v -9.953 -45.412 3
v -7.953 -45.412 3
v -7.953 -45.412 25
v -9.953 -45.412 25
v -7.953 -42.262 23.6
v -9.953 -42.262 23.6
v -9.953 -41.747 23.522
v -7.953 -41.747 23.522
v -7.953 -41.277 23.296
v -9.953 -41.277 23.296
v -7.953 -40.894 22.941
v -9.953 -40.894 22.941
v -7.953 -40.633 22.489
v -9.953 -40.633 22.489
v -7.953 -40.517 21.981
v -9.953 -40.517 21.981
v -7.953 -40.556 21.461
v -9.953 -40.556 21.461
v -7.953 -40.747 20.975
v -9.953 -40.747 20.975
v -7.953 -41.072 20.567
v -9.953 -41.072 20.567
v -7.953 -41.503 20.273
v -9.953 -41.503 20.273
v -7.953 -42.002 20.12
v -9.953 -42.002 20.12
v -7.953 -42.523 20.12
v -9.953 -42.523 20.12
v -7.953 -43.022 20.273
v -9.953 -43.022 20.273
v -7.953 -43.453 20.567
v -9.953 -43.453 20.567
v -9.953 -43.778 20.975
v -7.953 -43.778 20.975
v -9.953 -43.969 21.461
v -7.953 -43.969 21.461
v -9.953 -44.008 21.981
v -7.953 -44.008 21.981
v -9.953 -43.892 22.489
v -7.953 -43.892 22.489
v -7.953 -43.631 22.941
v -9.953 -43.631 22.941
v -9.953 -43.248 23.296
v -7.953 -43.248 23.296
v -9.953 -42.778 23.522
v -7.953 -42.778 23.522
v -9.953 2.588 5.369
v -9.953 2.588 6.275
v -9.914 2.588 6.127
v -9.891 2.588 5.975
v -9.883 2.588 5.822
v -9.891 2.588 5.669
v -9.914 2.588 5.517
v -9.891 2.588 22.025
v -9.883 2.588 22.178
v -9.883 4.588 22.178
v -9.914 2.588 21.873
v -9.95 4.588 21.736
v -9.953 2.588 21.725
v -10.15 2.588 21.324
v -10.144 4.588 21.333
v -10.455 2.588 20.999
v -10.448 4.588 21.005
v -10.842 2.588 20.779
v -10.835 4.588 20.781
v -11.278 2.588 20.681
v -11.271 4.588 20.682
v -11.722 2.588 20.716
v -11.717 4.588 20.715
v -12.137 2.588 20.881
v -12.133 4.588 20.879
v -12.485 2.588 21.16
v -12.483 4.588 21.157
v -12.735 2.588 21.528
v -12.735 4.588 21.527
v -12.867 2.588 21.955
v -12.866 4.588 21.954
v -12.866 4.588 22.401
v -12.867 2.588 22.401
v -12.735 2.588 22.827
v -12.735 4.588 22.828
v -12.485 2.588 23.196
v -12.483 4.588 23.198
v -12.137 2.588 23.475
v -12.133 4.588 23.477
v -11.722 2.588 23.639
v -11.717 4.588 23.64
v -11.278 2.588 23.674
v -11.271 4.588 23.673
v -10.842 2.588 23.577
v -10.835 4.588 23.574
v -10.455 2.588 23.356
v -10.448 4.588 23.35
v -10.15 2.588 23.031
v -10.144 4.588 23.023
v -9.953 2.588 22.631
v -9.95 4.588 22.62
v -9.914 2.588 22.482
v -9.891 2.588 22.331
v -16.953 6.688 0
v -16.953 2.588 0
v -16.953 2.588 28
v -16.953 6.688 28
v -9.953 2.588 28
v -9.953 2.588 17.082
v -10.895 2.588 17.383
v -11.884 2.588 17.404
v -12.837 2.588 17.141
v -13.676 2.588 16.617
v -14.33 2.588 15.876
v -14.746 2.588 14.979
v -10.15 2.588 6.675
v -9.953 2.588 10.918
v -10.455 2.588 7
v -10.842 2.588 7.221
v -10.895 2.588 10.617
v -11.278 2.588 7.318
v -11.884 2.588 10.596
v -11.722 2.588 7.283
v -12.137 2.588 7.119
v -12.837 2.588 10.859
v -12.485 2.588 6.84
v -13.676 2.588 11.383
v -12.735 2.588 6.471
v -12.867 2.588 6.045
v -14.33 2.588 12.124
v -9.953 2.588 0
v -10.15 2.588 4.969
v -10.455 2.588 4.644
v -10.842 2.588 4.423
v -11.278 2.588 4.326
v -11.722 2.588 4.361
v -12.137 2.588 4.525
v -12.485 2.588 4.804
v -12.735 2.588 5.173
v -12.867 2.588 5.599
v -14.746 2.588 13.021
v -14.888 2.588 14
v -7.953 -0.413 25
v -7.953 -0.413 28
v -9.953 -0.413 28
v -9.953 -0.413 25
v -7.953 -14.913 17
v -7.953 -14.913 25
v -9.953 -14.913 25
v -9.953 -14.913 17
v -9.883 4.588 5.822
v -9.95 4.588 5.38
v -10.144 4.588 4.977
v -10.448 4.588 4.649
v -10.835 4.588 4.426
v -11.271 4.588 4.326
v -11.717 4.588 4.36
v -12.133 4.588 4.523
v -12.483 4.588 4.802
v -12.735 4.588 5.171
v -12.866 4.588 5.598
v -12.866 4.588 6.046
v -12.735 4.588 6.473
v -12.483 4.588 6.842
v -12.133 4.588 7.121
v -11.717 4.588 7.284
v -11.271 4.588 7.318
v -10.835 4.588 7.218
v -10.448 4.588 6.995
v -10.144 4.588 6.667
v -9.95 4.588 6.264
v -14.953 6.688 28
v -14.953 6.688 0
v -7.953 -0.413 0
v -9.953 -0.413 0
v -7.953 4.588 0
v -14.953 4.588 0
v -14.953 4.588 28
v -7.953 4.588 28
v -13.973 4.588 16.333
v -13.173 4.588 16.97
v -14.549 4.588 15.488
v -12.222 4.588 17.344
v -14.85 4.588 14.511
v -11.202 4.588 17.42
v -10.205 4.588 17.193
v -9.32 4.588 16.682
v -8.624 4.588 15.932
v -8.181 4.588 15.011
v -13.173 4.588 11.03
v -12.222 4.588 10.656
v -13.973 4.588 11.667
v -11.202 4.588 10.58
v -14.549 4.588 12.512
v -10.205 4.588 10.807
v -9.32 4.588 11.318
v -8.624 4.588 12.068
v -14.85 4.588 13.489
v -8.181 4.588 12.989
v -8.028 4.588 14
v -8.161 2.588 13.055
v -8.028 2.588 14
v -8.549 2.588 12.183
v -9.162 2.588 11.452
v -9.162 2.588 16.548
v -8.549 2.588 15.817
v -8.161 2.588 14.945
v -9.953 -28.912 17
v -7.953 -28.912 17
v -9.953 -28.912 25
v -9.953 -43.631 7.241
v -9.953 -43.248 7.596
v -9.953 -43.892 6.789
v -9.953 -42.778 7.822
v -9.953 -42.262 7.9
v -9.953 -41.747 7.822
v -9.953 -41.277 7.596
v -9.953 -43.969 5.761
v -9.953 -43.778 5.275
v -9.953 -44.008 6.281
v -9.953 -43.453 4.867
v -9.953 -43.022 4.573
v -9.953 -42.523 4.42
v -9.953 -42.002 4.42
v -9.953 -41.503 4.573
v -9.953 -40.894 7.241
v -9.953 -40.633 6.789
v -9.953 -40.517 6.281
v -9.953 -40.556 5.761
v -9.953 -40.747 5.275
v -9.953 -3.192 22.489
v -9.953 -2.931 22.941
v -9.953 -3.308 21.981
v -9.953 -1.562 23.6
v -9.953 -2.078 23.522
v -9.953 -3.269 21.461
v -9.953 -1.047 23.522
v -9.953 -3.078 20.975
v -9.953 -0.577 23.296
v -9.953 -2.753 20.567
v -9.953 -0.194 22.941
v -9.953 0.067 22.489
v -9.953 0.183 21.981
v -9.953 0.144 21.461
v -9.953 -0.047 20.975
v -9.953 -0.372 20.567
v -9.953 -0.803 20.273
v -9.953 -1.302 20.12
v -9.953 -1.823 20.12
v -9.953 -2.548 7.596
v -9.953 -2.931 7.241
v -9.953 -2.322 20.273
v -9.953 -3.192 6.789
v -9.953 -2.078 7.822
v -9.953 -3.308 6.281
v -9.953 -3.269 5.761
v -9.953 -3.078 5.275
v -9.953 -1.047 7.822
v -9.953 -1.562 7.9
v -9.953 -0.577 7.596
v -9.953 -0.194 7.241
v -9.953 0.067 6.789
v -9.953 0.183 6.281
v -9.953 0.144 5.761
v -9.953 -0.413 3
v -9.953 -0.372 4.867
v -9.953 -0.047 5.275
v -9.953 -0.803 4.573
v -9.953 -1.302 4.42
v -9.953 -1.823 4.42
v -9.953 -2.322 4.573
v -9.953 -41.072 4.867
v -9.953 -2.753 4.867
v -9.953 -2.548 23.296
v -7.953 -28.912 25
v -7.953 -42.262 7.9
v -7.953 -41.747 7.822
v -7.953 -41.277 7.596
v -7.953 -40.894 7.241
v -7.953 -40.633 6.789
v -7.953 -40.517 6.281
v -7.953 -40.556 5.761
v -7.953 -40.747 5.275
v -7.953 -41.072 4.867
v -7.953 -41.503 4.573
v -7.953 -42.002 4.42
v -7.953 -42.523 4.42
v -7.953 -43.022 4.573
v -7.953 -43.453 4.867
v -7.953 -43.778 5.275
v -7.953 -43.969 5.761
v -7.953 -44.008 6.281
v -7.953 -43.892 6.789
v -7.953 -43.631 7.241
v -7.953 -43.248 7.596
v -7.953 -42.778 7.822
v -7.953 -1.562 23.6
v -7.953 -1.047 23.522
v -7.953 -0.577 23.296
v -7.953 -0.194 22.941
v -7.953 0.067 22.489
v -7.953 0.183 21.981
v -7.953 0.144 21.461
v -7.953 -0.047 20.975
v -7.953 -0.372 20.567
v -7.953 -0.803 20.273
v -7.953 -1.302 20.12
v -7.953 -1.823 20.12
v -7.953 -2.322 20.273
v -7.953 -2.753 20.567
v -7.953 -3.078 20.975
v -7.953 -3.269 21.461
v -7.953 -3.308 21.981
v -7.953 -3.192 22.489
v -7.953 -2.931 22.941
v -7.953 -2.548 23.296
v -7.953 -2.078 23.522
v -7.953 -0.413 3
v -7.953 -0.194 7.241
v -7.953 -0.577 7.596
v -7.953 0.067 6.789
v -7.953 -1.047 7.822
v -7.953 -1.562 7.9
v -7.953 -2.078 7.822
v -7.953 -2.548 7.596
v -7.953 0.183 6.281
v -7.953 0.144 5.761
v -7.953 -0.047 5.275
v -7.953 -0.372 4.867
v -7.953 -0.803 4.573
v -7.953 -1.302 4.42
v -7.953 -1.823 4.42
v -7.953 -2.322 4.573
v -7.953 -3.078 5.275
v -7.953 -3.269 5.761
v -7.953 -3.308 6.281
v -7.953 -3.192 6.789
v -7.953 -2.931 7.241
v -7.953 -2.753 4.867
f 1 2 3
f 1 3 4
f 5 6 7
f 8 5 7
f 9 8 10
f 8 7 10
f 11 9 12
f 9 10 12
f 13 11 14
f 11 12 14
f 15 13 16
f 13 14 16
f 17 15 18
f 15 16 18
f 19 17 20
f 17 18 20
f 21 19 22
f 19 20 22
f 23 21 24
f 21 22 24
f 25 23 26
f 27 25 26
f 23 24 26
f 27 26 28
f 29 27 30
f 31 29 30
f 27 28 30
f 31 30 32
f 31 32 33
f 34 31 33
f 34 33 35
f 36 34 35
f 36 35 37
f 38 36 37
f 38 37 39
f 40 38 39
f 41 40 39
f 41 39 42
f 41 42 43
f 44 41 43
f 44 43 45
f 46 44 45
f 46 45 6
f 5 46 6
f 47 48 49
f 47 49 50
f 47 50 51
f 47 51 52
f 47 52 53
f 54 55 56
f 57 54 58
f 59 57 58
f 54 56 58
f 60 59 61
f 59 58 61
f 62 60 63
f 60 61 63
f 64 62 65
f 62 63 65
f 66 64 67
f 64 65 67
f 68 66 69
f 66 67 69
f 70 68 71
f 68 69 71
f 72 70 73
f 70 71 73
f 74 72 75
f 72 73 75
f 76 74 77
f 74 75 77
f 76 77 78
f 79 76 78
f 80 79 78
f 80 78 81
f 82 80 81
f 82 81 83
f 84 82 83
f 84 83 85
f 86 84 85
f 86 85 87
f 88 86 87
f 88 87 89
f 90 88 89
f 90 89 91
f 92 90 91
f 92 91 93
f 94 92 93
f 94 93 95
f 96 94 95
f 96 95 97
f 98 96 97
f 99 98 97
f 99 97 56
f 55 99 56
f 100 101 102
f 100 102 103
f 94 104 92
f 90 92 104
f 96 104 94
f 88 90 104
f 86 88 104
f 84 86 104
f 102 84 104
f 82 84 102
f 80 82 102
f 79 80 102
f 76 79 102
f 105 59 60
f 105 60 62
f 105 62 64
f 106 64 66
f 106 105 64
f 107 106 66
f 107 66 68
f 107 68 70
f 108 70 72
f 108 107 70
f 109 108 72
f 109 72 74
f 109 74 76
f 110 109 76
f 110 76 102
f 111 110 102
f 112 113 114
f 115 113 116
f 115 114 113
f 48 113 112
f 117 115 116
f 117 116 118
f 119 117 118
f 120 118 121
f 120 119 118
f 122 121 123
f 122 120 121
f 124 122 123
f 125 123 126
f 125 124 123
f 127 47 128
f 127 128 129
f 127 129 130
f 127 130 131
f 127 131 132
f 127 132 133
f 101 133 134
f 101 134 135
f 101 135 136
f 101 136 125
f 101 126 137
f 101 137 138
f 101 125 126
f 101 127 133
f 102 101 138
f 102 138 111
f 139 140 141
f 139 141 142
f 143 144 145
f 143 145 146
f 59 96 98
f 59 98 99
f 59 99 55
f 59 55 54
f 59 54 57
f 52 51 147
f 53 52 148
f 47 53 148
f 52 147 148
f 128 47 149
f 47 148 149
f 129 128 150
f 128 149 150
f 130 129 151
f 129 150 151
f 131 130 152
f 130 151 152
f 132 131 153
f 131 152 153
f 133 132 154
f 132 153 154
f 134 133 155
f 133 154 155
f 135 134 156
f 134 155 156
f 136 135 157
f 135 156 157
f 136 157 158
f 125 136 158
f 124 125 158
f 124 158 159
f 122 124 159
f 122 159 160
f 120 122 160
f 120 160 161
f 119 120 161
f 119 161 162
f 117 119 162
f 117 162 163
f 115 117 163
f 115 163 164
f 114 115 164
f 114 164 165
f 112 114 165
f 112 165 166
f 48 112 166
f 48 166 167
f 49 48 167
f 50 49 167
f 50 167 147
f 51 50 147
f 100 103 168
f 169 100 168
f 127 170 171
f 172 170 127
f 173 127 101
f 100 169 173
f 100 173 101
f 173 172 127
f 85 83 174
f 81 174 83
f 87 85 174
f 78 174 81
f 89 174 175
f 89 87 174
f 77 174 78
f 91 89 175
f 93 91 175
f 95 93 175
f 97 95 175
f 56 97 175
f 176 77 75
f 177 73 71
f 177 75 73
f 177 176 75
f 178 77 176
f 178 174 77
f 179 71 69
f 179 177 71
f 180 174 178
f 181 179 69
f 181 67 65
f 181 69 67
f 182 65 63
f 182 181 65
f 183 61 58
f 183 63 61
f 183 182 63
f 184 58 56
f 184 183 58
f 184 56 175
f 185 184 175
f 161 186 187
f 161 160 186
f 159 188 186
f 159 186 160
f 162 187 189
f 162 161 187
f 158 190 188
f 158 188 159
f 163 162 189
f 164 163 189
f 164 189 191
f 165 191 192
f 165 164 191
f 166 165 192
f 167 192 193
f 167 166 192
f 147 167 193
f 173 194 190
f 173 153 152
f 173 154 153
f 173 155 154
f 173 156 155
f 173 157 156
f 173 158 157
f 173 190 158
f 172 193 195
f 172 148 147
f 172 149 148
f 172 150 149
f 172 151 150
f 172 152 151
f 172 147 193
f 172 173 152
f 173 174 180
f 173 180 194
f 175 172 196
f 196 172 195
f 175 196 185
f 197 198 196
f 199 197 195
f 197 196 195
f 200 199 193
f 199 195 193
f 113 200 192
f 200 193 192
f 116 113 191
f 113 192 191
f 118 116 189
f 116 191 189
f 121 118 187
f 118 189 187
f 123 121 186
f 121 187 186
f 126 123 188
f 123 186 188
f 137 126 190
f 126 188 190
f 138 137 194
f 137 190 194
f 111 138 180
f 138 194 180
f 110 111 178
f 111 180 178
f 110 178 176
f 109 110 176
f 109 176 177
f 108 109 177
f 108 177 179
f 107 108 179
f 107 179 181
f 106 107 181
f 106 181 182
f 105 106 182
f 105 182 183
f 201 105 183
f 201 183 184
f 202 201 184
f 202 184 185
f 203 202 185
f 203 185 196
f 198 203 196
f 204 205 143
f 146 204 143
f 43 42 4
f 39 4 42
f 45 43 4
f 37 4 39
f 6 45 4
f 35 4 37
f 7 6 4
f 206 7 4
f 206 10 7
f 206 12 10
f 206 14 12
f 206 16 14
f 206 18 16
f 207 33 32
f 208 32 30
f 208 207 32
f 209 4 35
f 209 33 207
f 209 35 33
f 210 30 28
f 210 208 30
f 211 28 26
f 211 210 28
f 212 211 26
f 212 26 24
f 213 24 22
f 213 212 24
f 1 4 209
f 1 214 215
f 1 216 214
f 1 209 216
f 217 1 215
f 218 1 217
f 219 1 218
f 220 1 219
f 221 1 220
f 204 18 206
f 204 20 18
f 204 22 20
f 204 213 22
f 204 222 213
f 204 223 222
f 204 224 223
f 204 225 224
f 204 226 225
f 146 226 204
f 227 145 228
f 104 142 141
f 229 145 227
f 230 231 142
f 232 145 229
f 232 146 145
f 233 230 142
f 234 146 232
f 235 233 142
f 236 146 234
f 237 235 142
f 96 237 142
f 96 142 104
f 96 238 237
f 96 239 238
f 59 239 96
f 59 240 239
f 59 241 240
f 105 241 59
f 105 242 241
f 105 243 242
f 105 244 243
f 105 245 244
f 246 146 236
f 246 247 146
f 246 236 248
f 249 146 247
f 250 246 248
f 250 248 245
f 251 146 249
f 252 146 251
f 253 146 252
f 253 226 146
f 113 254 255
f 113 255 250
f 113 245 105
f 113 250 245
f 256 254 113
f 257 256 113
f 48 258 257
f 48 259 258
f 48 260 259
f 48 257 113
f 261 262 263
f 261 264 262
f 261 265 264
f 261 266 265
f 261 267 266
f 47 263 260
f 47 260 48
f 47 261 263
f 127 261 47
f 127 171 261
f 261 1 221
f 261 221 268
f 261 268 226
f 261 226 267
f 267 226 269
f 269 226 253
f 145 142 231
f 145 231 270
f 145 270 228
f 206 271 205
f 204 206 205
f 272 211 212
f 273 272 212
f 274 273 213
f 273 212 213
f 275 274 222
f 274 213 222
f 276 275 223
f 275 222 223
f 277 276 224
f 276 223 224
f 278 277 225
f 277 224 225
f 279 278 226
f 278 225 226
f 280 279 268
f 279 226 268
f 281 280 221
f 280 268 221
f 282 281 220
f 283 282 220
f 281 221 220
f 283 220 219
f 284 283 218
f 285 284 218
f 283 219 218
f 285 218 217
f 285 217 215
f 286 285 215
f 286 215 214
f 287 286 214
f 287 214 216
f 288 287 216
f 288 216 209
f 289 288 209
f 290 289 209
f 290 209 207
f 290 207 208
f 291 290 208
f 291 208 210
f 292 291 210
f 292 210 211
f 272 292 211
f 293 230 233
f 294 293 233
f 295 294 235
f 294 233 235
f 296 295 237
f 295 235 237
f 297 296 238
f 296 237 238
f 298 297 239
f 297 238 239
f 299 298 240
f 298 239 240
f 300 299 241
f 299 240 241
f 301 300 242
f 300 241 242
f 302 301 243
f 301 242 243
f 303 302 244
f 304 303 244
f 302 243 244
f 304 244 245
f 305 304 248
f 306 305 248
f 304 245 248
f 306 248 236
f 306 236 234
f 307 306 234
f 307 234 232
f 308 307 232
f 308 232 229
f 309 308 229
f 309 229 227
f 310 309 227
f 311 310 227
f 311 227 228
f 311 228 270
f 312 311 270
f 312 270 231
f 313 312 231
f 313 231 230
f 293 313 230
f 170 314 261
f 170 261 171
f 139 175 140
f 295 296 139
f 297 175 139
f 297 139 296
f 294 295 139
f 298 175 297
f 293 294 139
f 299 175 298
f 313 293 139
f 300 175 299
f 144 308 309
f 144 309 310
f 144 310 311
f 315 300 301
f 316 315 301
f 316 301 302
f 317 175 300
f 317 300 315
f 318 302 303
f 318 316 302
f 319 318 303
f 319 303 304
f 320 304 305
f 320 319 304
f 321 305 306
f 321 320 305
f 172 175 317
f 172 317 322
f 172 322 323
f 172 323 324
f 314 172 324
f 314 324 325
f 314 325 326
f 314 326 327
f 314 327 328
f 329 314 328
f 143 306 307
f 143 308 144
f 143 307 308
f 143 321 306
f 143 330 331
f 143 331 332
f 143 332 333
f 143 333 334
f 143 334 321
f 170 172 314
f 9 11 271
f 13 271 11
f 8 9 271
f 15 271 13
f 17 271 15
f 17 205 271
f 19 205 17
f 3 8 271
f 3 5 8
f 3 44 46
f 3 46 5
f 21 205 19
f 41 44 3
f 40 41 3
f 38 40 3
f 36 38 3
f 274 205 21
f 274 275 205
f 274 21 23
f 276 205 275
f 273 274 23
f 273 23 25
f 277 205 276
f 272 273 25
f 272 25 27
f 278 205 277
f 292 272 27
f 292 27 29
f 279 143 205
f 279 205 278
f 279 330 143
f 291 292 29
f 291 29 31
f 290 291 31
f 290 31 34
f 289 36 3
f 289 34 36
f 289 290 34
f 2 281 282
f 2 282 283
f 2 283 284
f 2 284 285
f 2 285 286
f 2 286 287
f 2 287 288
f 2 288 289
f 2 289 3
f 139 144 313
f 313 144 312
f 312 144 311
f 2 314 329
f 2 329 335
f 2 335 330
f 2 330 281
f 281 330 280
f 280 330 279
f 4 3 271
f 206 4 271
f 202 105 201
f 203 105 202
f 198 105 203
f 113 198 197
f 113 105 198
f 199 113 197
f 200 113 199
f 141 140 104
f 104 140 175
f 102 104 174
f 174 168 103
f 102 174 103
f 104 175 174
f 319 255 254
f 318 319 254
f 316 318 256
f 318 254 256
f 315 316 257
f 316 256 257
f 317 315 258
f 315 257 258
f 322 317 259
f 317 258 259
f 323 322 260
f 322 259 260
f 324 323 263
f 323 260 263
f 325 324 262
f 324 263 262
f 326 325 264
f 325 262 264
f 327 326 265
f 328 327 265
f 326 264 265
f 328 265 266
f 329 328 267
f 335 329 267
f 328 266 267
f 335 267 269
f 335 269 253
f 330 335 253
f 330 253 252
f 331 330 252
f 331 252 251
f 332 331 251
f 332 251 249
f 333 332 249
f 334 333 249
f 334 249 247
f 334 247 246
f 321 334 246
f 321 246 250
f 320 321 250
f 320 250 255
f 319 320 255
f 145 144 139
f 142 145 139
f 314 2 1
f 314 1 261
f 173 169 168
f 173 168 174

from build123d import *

# Parameters (mm, degrees)
BOSS_EXTRUDE3_DEPTH = 28
SKETCH4_R           = 3.43
SKETCH4_R_2         = 1.5
CUT_EXTRUDE1_DEPTH  = 2
SKETCH6_W           = 3
SKETCH6_H           = 45
CUT_EXTRUDE4_DEPTH  = 2
SKETCH7_R           = 1.75
CUT_EXTRUDE5_DEPTH  = 3
SKETCH10_W          = 8
SKETCH10_H          = 14
CUT_EXTRUDE7_DEPTH  = 10


with BuildPart() as part:
    # Sketch3 → Boss-Extrude3 (new body)
    with BuildSketch(Plane.XY):
        Polygon((-16.953175304, 6.6875), (-14.953175304, 6.6875), (-14.953175304, 4.5875), (-7.953175304, 4.5875), (-7.953175304, -45.4125), (-9.953175304, -45.4125), (-9.953175304, 2.5875), (-16.953175304, 2.5875), align=None)
    extrude(amount=BOSS_EXTRUDE3_DEPTH)

    # Sketch4 → Cut-Extrude1 (cut)
    with BuildSketch(Plane(origin=(0, 4.5875, 0), x_dir=(1, 0, 0), z_dir=(0, 1, 0))):
        with Locations((-11.458423587, -14)):
            Circle(SKETCH4_R)
        with Locations((-11.383175304, -5.822)):
            Circle(SKETCH4_R_2)
        with Locations((-11.383175304, -22.177653801)):
            Circle(SKETCH4_R_2)
    extrude(amount=-CUT_EXTRUDE1_DEPTH, mode=Mode.SUBTRACT)

    # Sketch6 → Cut-Extrude4 (cut)
    with BuildSketch(Plane(origin=(-7.953175304, 0, 0), x_dir=(0, 0, -1), z_dir=(1, 0, 0))):
        with Locations((-26.5, -22.9125)):
            Rectangle(SKETCH6_W, SKETCH6_H)
        with Locations((-1.5, -22.9125)):
            Rectangle(SKETCH6_W, SKETCH6_H)
    extrude(amount=-CUT_EXTRUDE4_DEPTH, mode=Mode.SUBTRACT)

    # Sketch7 → Cut-Extrude5 (cut, through all)
    with BuildSketch(Plane.ZY.offset(9.953175304)):
        with Locations((21.85, -42.2625)):
            Circle(SKETCH7_R)
        with Locations((6.15, -42.2625)):
            Circle(SKETCH7_R)
        with Locations((6.15, -1.5625)):
            Circle(SKETCH7_R)
        with Locations((21.85, -1.5625)):
            Circle(SKETCH7_R)
    extrude(amount=-CUT_EXTRUDE5_DEPTH, mode=Mode.SUBTRACT)

    # Sketch10 → Cut-Extrude7 (cut, through all)
    with BuildSketch(Plane(origin=(-7.953175304, 0, 0), x_dir=(0, 0, -1), z_dir=(1, 0, 0))):
        with Locations((-21, -21.9125)):
            Rectangle(SKETCH10_W, SKETCH10_H)
    extrude(amount=-CUT_EXTRUDE7_DEPTH, mode=Mode.SUBTRACT)


solid = part.part
